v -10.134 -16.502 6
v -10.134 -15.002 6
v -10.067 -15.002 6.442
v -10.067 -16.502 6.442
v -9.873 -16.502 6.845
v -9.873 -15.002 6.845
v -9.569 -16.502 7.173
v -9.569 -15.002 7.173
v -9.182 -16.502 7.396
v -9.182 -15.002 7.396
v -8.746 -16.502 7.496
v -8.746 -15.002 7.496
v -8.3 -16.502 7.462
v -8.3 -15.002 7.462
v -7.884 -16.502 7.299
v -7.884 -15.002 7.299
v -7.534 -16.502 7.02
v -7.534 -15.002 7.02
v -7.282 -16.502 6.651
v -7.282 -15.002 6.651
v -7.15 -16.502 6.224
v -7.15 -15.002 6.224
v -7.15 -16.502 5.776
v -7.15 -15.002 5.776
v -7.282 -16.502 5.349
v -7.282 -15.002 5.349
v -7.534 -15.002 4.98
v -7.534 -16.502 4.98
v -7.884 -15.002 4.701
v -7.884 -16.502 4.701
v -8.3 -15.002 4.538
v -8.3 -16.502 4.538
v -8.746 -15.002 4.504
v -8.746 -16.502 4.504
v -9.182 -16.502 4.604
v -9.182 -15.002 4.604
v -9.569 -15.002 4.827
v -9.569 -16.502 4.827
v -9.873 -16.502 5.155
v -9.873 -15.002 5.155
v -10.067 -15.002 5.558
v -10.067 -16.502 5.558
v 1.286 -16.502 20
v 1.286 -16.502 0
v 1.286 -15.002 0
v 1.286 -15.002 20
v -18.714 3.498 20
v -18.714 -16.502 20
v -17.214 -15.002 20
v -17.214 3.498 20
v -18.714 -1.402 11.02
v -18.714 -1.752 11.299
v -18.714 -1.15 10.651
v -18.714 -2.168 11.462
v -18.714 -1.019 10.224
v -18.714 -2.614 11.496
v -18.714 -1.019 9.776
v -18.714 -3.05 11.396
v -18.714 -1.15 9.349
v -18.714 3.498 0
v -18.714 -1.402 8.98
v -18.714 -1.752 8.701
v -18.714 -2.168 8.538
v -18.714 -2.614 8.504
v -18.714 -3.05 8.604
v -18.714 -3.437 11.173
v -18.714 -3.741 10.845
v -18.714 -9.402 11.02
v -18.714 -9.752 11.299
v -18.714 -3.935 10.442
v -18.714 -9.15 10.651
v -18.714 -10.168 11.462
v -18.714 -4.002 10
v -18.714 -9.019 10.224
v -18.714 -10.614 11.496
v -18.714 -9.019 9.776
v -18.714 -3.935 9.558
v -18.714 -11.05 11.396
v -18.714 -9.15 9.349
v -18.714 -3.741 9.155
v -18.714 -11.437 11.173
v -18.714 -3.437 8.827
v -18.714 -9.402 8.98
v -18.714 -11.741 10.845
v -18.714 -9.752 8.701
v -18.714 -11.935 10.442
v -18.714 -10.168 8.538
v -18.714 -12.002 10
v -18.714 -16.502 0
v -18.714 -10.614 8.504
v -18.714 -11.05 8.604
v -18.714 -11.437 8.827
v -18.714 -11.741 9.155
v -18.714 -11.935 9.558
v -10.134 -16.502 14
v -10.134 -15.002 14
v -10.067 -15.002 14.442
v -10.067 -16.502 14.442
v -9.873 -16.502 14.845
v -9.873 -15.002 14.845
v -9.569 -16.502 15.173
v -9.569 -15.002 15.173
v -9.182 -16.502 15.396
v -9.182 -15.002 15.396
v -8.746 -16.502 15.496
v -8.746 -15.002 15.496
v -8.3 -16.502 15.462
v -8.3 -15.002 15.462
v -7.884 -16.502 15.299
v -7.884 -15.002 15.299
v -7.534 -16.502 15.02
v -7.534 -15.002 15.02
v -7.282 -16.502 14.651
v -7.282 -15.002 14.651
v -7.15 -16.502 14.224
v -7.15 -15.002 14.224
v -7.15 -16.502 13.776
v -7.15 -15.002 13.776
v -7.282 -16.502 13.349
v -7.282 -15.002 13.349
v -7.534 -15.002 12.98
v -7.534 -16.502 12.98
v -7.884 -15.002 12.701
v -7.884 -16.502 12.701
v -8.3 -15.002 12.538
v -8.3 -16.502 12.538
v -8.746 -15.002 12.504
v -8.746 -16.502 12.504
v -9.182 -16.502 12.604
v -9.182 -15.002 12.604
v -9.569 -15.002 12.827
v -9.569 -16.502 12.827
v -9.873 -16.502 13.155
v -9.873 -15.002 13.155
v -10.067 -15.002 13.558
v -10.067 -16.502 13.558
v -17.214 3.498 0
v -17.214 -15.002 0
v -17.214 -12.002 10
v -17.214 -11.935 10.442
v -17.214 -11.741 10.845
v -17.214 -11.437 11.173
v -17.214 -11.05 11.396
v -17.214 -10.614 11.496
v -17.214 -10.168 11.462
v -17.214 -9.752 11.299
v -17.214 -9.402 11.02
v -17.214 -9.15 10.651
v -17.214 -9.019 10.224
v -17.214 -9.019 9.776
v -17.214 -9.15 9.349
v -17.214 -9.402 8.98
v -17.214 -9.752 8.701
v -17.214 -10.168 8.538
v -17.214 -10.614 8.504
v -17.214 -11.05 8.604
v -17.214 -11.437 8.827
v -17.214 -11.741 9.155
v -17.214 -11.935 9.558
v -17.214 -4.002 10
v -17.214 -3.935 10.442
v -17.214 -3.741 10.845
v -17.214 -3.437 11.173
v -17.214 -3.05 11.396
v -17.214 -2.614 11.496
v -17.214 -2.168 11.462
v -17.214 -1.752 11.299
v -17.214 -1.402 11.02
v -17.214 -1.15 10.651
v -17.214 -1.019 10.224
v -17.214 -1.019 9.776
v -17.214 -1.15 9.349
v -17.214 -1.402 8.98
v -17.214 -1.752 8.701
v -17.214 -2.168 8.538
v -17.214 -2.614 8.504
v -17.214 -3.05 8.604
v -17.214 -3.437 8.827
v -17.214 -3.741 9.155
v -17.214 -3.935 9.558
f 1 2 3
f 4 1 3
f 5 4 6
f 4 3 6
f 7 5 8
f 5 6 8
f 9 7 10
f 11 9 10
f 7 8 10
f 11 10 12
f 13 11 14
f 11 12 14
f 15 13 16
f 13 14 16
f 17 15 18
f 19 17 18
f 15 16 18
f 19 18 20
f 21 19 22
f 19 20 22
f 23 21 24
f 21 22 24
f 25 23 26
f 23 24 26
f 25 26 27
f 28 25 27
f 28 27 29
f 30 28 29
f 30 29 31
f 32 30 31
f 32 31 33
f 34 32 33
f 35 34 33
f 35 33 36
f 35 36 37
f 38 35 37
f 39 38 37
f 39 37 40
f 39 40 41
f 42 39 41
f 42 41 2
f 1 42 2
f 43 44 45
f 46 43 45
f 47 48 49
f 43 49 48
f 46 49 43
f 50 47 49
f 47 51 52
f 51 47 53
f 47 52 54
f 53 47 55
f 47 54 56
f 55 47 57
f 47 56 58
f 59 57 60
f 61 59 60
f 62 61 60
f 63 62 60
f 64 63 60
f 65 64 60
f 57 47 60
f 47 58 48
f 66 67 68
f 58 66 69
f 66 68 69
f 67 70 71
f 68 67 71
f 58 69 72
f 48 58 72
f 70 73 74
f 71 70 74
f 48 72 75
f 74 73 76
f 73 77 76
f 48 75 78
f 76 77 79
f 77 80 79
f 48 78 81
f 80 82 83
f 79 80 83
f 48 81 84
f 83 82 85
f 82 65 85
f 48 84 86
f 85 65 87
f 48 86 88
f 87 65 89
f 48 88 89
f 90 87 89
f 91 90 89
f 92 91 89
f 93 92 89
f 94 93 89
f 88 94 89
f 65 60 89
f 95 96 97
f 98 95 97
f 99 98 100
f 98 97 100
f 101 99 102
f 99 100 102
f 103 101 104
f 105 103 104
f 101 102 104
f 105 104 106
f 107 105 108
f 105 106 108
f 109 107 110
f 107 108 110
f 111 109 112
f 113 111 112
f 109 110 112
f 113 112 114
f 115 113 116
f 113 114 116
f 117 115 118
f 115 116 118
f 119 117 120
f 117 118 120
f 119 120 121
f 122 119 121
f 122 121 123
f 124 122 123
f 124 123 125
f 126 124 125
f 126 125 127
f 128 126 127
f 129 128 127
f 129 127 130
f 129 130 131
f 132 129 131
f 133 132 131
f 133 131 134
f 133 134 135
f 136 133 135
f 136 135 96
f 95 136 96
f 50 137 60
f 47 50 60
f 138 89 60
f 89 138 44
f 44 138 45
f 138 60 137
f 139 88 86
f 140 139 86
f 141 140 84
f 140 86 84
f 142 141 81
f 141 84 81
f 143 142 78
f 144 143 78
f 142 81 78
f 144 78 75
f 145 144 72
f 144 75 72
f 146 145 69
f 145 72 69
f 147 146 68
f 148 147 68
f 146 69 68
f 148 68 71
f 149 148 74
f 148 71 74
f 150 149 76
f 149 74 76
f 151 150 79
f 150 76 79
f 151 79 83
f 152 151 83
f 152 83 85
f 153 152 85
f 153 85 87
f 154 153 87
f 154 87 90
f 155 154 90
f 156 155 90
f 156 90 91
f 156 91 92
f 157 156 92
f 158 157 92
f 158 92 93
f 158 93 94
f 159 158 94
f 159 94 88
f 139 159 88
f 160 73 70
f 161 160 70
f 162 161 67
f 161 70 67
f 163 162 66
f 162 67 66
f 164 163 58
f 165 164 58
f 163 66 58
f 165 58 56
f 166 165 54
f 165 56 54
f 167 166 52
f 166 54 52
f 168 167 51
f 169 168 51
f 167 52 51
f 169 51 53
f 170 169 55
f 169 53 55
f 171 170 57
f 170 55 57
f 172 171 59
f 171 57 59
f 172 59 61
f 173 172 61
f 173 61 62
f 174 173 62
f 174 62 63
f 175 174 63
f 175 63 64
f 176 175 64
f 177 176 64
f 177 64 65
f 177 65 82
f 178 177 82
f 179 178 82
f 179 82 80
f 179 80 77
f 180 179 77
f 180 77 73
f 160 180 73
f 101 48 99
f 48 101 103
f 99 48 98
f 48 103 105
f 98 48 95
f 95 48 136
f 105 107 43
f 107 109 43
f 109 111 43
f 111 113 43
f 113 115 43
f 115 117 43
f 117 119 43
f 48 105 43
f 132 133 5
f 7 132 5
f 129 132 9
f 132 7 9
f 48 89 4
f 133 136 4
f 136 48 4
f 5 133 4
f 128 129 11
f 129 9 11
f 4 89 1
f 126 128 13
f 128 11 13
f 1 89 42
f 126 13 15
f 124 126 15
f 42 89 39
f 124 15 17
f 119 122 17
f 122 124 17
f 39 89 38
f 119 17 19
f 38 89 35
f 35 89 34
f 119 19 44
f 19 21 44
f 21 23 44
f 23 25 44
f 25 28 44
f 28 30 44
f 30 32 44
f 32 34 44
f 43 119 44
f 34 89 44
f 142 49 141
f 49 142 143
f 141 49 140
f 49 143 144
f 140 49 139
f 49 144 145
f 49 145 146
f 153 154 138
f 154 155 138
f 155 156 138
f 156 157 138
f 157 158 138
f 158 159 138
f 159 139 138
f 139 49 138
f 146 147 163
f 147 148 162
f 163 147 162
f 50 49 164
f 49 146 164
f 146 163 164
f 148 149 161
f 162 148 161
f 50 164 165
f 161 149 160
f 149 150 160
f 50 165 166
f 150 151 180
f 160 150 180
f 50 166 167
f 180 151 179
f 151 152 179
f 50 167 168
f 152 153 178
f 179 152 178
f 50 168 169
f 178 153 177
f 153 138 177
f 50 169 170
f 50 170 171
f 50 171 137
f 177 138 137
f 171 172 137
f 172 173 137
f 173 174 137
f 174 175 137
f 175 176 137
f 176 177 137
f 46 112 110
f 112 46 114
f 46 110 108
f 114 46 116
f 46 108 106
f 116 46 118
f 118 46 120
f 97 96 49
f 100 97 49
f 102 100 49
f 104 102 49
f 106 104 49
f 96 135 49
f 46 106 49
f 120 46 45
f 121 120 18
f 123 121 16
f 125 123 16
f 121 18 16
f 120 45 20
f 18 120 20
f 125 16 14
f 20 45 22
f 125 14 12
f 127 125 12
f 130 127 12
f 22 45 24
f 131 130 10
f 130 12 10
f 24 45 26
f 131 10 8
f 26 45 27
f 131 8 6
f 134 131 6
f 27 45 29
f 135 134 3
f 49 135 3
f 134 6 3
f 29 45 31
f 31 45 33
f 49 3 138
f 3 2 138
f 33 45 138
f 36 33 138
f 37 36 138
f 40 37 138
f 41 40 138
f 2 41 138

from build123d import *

# Parameters (mm, degrees)
EXTRUSION1_DEPTH = 20
ESQUISSE2_R      = 1.5
EXTRUSION2_DEPTH = 20
ESQUISSE3_R      = 1.5
EXTRUSION3_DEPTH = 10


with BuildPart() as part:
    # Esquisse1 → Extrusion1 (new body)
    with BuildSketch(Plane.XY):
        Polygon((-18.714271359, 3.498089172), (-18.714271359, -16.501910828), (1.285728641, -16.501910828), (1.285728641, -15.001910828), (-17.214271359, -15.001910828), (-17.214271359, 3.498089172), align=None)
    extrude(amount=EXTRUSION1_DEPTH)

    # Esquisse2 → Extrusion2 (cut)
    with BuildSketch(Plane(origin=(0, -15.001910828, 0), x_dir=(-1, 0, 0), z_dir=(0, 1, 0))):
        with Locations((8.633652734, 14)):
            Circle(ESQUISSE2_R)
        with Locations((8.633652734, 6)):
            Circle(ESQUISSE2_R)
    extrude(amount=-EXTRUSION2_DEPTH, mode=Mode.SUBTRACT)

    # Esquisse3 → Extrusion3 (cut)
    with BuildSketch(Plane.ZY.offset(18.714271359)):
        with Locations(Location((10, -10.501910828, 0), (0, 0, 270))):
            Circle(ESQUISSE3_R)
        with Locations(Location((10, -2.501910828, 0), (0, 0, 270))):
            Circle(ESQUISSE3_R)
    extrude(amount=-EXTRUSION3_DEPTH, mode=Mode.SUBTRACT)


solid = part.part
